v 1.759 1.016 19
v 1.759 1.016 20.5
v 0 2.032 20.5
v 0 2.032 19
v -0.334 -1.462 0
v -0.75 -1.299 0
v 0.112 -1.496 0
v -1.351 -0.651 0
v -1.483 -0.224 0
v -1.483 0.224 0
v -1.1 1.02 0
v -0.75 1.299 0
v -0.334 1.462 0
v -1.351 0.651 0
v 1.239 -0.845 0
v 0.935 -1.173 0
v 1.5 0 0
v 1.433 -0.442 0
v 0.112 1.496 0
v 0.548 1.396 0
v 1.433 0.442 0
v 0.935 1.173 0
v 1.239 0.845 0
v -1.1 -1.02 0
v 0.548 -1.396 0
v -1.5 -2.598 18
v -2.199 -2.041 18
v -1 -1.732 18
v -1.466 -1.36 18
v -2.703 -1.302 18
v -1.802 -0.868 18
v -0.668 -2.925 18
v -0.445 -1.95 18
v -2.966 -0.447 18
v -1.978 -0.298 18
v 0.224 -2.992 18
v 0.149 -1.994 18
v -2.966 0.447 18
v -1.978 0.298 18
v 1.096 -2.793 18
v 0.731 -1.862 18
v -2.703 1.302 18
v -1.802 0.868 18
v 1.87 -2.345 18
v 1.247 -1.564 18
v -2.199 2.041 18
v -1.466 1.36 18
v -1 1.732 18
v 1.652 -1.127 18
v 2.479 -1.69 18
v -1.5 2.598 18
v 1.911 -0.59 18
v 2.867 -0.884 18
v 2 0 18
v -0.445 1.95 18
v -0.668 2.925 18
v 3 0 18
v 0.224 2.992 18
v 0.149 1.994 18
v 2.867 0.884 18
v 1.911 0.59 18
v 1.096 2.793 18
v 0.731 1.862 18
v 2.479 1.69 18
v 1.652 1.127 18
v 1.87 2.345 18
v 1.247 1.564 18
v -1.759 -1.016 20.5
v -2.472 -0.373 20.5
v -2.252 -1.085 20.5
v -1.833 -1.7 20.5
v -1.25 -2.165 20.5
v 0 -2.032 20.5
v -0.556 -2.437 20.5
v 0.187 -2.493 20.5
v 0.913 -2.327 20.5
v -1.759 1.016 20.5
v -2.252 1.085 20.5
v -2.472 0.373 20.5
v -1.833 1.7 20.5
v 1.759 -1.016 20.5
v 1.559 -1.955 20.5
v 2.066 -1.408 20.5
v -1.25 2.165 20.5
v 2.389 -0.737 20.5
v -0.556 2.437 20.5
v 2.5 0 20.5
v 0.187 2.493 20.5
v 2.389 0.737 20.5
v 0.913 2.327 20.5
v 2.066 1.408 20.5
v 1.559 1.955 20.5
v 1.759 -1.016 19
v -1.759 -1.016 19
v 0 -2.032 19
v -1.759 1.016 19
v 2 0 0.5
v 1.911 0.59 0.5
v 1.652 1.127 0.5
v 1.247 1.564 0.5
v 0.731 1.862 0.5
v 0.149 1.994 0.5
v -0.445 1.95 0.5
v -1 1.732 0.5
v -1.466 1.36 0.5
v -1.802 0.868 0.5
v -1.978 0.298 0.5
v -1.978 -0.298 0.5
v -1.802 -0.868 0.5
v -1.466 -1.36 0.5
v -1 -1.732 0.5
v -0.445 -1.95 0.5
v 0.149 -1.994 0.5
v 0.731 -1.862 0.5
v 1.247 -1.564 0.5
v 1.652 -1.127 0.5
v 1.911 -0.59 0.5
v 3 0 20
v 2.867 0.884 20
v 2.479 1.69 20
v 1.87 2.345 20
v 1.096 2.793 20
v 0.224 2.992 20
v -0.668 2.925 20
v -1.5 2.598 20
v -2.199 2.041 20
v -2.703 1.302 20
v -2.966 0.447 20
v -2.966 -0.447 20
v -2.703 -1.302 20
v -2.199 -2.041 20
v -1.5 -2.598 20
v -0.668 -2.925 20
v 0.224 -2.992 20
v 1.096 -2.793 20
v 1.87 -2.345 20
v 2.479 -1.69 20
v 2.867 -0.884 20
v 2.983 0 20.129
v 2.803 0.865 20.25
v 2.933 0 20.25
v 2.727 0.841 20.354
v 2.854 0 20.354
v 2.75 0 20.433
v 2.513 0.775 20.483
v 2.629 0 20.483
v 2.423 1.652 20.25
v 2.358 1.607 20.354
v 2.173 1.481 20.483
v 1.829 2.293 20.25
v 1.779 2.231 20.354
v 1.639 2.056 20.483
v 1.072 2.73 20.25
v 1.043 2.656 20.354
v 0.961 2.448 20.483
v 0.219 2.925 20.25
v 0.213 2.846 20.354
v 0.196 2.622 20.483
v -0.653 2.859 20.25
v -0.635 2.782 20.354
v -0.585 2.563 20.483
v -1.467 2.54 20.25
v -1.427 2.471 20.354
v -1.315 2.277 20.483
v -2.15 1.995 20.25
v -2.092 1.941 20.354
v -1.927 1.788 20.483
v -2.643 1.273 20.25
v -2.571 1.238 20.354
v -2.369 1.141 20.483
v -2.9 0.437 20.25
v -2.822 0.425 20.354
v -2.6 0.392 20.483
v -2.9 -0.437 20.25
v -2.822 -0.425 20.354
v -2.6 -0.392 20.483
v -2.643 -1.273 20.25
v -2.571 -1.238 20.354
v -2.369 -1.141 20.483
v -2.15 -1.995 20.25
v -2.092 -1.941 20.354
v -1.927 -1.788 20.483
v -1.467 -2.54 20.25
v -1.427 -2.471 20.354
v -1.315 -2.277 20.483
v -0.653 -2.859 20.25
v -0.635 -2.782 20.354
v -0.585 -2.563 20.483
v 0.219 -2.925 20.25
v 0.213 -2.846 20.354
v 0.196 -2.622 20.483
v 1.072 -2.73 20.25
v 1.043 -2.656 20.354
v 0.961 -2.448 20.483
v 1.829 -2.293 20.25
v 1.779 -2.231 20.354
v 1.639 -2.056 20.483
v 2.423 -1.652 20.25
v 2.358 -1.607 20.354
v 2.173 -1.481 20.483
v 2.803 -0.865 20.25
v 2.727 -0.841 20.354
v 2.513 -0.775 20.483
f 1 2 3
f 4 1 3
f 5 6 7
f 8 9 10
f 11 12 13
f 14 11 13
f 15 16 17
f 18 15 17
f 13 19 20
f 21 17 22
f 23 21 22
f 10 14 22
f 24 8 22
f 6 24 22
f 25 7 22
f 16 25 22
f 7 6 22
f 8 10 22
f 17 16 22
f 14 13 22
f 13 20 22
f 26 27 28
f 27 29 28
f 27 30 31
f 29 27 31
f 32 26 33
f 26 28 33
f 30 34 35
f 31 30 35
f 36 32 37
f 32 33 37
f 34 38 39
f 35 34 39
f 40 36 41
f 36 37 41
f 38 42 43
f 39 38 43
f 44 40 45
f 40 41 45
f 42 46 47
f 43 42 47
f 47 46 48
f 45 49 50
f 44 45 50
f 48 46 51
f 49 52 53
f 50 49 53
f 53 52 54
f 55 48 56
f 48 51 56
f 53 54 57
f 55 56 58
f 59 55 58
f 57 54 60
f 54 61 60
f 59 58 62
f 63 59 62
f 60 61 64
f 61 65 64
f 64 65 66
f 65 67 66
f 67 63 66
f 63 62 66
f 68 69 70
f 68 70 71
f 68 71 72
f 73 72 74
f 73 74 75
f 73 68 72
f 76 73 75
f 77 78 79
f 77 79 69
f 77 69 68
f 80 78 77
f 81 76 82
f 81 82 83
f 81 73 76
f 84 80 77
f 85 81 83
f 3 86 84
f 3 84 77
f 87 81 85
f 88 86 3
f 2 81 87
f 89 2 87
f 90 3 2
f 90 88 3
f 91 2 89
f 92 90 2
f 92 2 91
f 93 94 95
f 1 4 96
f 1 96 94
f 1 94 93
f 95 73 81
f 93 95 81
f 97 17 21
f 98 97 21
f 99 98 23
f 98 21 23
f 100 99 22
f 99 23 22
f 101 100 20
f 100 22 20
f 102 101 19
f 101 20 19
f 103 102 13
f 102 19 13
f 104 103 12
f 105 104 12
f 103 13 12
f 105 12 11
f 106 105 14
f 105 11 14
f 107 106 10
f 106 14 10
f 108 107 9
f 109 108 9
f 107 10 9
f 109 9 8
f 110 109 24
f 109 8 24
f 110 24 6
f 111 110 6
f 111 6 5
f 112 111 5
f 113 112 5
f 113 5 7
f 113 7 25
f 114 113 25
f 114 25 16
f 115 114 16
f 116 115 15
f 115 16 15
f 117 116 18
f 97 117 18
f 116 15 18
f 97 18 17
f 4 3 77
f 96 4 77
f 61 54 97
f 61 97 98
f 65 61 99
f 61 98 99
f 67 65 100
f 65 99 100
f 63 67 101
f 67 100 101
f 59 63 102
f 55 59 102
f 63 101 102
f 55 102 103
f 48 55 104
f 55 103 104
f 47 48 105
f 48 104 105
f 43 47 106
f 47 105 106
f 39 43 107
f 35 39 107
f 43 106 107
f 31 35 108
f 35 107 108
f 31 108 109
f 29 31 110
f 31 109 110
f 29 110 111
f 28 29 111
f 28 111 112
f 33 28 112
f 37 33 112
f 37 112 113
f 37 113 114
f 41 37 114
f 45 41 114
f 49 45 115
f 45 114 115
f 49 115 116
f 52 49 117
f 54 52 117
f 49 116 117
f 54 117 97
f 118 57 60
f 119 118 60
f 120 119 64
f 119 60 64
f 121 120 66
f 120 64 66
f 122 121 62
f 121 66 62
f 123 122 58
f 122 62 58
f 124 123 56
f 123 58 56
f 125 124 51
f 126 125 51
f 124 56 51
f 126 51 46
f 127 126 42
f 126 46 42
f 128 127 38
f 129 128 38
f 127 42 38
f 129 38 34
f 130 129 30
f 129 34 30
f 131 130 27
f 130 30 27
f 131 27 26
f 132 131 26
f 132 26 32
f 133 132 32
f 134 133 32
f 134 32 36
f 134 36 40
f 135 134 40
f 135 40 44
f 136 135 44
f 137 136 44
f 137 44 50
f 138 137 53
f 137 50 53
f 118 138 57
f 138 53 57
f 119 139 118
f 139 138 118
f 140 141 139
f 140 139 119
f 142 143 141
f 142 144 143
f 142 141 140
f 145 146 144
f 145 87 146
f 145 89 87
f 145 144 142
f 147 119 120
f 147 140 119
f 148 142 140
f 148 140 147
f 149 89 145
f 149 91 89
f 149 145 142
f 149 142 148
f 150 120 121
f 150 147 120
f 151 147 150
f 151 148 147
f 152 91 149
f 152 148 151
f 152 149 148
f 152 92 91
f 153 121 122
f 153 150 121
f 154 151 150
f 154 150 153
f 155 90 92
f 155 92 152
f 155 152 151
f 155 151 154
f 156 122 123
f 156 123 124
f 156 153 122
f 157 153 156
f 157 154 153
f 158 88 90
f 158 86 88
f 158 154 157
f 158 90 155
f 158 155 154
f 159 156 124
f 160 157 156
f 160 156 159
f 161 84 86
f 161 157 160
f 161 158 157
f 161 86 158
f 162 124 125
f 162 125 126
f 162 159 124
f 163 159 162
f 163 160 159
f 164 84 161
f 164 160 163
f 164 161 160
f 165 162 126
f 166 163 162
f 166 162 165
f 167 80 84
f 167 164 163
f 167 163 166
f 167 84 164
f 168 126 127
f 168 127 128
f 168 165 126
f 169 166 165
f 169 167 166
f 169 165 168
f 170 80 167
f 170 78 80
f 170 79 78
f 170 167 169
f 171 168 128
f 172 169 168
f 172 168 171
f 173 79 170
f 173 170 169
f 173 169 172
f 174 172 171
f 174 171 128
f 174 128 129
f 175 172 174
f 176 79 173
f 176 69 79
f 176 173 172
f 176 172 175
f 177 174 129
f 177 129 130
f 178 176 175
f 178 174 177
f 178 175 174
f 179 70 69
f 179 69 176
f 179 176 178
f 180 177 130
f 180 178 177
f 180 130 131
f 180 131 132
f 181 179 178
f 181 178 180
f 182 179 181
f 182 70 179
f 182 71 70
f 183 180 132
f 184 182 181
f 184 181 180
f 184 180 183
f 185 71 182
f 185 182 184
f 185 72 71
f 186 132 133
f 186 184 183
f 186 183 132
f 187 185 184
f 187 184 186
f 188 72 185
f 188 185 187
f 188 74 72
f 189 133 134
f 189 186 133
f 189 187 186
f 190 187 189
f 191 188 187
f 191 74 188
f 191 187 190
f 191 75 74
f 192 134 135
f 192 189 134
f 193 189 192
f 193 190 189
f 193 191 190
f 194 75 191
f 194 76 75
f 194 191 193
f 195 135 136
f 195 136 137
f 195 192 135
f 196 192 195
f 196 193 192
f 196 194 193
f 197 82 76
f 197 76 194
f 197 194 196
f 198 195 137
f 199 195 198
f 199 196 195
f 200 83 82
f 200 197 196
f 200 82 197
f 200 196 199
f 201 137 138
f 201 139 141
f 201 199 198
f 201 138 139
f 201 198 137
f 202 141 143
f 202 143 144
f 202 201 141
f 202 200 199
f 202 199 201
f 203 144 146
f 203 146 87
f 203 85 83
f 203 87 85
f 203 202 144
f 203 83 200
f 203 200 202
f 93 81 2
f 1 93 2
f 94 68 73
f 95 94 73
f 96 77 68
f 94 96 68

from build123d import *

# Parameters (mm, degrees)
SKETCH_1_R          = 2
EXTRUDE_1_DEPTH     = 18
SKETCH_2_R          = 3
EXTRUDE_2_DEPTH     = 2.5
CUT_EXTRUDE_1_DEPTH = 1.5
CHAMFER_1_SIZE      = 0.5
FILLET_1_R          = 0.5


with BuildPart() as part:
    # 草图1 → 凸台-拉伸1 (new body)
    with BuildSketch(Plane.XY):
        Circle(SKETCH_1_R)
    extrude(amount=EXTRUDE_1_DEPTH)

    # 草图2 → 凸台-拉伸2 (add)
    with BuildSketch(Plane.XY.offset(18)):
        Circle(SKETCH_2_R)
    extrude(amount=EXTRUDE_2_DEPTH)

    # 草图4 → 切除-拉伸1 (cut)
    with BuildSketch(Plane.XY.offset(20.5)):
        Polygon((0, 2.031649792), (-1.759460331, 1.015824896), (-1.759460331, -1.015824896), (0, -2.031649792), (1.759460331, -1.015824896), (1.759460331, 1.015824896), align=None)
    extrude(amount=-CUT_EXTRUDE_1_DEPTH, mode=Mode.SUBTRACT)

    # 倒角1
    chamfer_1_edges = [part.edges().sort_by_distance(p)[0] for p in [
        (-2, 0, 0),
    ]]
    chamfer(chamfer_1_edges, length=CHAMFER_1_SIZE)

    # 圆角1
    fillet_1_edges = [part.edges().sort_by_distance(p)[0] for p in [
        (-3, 0, 20.5),
    ]]
    fillet(fillet_1_edges, radius=FILLET_1_R)


solid = part.part
